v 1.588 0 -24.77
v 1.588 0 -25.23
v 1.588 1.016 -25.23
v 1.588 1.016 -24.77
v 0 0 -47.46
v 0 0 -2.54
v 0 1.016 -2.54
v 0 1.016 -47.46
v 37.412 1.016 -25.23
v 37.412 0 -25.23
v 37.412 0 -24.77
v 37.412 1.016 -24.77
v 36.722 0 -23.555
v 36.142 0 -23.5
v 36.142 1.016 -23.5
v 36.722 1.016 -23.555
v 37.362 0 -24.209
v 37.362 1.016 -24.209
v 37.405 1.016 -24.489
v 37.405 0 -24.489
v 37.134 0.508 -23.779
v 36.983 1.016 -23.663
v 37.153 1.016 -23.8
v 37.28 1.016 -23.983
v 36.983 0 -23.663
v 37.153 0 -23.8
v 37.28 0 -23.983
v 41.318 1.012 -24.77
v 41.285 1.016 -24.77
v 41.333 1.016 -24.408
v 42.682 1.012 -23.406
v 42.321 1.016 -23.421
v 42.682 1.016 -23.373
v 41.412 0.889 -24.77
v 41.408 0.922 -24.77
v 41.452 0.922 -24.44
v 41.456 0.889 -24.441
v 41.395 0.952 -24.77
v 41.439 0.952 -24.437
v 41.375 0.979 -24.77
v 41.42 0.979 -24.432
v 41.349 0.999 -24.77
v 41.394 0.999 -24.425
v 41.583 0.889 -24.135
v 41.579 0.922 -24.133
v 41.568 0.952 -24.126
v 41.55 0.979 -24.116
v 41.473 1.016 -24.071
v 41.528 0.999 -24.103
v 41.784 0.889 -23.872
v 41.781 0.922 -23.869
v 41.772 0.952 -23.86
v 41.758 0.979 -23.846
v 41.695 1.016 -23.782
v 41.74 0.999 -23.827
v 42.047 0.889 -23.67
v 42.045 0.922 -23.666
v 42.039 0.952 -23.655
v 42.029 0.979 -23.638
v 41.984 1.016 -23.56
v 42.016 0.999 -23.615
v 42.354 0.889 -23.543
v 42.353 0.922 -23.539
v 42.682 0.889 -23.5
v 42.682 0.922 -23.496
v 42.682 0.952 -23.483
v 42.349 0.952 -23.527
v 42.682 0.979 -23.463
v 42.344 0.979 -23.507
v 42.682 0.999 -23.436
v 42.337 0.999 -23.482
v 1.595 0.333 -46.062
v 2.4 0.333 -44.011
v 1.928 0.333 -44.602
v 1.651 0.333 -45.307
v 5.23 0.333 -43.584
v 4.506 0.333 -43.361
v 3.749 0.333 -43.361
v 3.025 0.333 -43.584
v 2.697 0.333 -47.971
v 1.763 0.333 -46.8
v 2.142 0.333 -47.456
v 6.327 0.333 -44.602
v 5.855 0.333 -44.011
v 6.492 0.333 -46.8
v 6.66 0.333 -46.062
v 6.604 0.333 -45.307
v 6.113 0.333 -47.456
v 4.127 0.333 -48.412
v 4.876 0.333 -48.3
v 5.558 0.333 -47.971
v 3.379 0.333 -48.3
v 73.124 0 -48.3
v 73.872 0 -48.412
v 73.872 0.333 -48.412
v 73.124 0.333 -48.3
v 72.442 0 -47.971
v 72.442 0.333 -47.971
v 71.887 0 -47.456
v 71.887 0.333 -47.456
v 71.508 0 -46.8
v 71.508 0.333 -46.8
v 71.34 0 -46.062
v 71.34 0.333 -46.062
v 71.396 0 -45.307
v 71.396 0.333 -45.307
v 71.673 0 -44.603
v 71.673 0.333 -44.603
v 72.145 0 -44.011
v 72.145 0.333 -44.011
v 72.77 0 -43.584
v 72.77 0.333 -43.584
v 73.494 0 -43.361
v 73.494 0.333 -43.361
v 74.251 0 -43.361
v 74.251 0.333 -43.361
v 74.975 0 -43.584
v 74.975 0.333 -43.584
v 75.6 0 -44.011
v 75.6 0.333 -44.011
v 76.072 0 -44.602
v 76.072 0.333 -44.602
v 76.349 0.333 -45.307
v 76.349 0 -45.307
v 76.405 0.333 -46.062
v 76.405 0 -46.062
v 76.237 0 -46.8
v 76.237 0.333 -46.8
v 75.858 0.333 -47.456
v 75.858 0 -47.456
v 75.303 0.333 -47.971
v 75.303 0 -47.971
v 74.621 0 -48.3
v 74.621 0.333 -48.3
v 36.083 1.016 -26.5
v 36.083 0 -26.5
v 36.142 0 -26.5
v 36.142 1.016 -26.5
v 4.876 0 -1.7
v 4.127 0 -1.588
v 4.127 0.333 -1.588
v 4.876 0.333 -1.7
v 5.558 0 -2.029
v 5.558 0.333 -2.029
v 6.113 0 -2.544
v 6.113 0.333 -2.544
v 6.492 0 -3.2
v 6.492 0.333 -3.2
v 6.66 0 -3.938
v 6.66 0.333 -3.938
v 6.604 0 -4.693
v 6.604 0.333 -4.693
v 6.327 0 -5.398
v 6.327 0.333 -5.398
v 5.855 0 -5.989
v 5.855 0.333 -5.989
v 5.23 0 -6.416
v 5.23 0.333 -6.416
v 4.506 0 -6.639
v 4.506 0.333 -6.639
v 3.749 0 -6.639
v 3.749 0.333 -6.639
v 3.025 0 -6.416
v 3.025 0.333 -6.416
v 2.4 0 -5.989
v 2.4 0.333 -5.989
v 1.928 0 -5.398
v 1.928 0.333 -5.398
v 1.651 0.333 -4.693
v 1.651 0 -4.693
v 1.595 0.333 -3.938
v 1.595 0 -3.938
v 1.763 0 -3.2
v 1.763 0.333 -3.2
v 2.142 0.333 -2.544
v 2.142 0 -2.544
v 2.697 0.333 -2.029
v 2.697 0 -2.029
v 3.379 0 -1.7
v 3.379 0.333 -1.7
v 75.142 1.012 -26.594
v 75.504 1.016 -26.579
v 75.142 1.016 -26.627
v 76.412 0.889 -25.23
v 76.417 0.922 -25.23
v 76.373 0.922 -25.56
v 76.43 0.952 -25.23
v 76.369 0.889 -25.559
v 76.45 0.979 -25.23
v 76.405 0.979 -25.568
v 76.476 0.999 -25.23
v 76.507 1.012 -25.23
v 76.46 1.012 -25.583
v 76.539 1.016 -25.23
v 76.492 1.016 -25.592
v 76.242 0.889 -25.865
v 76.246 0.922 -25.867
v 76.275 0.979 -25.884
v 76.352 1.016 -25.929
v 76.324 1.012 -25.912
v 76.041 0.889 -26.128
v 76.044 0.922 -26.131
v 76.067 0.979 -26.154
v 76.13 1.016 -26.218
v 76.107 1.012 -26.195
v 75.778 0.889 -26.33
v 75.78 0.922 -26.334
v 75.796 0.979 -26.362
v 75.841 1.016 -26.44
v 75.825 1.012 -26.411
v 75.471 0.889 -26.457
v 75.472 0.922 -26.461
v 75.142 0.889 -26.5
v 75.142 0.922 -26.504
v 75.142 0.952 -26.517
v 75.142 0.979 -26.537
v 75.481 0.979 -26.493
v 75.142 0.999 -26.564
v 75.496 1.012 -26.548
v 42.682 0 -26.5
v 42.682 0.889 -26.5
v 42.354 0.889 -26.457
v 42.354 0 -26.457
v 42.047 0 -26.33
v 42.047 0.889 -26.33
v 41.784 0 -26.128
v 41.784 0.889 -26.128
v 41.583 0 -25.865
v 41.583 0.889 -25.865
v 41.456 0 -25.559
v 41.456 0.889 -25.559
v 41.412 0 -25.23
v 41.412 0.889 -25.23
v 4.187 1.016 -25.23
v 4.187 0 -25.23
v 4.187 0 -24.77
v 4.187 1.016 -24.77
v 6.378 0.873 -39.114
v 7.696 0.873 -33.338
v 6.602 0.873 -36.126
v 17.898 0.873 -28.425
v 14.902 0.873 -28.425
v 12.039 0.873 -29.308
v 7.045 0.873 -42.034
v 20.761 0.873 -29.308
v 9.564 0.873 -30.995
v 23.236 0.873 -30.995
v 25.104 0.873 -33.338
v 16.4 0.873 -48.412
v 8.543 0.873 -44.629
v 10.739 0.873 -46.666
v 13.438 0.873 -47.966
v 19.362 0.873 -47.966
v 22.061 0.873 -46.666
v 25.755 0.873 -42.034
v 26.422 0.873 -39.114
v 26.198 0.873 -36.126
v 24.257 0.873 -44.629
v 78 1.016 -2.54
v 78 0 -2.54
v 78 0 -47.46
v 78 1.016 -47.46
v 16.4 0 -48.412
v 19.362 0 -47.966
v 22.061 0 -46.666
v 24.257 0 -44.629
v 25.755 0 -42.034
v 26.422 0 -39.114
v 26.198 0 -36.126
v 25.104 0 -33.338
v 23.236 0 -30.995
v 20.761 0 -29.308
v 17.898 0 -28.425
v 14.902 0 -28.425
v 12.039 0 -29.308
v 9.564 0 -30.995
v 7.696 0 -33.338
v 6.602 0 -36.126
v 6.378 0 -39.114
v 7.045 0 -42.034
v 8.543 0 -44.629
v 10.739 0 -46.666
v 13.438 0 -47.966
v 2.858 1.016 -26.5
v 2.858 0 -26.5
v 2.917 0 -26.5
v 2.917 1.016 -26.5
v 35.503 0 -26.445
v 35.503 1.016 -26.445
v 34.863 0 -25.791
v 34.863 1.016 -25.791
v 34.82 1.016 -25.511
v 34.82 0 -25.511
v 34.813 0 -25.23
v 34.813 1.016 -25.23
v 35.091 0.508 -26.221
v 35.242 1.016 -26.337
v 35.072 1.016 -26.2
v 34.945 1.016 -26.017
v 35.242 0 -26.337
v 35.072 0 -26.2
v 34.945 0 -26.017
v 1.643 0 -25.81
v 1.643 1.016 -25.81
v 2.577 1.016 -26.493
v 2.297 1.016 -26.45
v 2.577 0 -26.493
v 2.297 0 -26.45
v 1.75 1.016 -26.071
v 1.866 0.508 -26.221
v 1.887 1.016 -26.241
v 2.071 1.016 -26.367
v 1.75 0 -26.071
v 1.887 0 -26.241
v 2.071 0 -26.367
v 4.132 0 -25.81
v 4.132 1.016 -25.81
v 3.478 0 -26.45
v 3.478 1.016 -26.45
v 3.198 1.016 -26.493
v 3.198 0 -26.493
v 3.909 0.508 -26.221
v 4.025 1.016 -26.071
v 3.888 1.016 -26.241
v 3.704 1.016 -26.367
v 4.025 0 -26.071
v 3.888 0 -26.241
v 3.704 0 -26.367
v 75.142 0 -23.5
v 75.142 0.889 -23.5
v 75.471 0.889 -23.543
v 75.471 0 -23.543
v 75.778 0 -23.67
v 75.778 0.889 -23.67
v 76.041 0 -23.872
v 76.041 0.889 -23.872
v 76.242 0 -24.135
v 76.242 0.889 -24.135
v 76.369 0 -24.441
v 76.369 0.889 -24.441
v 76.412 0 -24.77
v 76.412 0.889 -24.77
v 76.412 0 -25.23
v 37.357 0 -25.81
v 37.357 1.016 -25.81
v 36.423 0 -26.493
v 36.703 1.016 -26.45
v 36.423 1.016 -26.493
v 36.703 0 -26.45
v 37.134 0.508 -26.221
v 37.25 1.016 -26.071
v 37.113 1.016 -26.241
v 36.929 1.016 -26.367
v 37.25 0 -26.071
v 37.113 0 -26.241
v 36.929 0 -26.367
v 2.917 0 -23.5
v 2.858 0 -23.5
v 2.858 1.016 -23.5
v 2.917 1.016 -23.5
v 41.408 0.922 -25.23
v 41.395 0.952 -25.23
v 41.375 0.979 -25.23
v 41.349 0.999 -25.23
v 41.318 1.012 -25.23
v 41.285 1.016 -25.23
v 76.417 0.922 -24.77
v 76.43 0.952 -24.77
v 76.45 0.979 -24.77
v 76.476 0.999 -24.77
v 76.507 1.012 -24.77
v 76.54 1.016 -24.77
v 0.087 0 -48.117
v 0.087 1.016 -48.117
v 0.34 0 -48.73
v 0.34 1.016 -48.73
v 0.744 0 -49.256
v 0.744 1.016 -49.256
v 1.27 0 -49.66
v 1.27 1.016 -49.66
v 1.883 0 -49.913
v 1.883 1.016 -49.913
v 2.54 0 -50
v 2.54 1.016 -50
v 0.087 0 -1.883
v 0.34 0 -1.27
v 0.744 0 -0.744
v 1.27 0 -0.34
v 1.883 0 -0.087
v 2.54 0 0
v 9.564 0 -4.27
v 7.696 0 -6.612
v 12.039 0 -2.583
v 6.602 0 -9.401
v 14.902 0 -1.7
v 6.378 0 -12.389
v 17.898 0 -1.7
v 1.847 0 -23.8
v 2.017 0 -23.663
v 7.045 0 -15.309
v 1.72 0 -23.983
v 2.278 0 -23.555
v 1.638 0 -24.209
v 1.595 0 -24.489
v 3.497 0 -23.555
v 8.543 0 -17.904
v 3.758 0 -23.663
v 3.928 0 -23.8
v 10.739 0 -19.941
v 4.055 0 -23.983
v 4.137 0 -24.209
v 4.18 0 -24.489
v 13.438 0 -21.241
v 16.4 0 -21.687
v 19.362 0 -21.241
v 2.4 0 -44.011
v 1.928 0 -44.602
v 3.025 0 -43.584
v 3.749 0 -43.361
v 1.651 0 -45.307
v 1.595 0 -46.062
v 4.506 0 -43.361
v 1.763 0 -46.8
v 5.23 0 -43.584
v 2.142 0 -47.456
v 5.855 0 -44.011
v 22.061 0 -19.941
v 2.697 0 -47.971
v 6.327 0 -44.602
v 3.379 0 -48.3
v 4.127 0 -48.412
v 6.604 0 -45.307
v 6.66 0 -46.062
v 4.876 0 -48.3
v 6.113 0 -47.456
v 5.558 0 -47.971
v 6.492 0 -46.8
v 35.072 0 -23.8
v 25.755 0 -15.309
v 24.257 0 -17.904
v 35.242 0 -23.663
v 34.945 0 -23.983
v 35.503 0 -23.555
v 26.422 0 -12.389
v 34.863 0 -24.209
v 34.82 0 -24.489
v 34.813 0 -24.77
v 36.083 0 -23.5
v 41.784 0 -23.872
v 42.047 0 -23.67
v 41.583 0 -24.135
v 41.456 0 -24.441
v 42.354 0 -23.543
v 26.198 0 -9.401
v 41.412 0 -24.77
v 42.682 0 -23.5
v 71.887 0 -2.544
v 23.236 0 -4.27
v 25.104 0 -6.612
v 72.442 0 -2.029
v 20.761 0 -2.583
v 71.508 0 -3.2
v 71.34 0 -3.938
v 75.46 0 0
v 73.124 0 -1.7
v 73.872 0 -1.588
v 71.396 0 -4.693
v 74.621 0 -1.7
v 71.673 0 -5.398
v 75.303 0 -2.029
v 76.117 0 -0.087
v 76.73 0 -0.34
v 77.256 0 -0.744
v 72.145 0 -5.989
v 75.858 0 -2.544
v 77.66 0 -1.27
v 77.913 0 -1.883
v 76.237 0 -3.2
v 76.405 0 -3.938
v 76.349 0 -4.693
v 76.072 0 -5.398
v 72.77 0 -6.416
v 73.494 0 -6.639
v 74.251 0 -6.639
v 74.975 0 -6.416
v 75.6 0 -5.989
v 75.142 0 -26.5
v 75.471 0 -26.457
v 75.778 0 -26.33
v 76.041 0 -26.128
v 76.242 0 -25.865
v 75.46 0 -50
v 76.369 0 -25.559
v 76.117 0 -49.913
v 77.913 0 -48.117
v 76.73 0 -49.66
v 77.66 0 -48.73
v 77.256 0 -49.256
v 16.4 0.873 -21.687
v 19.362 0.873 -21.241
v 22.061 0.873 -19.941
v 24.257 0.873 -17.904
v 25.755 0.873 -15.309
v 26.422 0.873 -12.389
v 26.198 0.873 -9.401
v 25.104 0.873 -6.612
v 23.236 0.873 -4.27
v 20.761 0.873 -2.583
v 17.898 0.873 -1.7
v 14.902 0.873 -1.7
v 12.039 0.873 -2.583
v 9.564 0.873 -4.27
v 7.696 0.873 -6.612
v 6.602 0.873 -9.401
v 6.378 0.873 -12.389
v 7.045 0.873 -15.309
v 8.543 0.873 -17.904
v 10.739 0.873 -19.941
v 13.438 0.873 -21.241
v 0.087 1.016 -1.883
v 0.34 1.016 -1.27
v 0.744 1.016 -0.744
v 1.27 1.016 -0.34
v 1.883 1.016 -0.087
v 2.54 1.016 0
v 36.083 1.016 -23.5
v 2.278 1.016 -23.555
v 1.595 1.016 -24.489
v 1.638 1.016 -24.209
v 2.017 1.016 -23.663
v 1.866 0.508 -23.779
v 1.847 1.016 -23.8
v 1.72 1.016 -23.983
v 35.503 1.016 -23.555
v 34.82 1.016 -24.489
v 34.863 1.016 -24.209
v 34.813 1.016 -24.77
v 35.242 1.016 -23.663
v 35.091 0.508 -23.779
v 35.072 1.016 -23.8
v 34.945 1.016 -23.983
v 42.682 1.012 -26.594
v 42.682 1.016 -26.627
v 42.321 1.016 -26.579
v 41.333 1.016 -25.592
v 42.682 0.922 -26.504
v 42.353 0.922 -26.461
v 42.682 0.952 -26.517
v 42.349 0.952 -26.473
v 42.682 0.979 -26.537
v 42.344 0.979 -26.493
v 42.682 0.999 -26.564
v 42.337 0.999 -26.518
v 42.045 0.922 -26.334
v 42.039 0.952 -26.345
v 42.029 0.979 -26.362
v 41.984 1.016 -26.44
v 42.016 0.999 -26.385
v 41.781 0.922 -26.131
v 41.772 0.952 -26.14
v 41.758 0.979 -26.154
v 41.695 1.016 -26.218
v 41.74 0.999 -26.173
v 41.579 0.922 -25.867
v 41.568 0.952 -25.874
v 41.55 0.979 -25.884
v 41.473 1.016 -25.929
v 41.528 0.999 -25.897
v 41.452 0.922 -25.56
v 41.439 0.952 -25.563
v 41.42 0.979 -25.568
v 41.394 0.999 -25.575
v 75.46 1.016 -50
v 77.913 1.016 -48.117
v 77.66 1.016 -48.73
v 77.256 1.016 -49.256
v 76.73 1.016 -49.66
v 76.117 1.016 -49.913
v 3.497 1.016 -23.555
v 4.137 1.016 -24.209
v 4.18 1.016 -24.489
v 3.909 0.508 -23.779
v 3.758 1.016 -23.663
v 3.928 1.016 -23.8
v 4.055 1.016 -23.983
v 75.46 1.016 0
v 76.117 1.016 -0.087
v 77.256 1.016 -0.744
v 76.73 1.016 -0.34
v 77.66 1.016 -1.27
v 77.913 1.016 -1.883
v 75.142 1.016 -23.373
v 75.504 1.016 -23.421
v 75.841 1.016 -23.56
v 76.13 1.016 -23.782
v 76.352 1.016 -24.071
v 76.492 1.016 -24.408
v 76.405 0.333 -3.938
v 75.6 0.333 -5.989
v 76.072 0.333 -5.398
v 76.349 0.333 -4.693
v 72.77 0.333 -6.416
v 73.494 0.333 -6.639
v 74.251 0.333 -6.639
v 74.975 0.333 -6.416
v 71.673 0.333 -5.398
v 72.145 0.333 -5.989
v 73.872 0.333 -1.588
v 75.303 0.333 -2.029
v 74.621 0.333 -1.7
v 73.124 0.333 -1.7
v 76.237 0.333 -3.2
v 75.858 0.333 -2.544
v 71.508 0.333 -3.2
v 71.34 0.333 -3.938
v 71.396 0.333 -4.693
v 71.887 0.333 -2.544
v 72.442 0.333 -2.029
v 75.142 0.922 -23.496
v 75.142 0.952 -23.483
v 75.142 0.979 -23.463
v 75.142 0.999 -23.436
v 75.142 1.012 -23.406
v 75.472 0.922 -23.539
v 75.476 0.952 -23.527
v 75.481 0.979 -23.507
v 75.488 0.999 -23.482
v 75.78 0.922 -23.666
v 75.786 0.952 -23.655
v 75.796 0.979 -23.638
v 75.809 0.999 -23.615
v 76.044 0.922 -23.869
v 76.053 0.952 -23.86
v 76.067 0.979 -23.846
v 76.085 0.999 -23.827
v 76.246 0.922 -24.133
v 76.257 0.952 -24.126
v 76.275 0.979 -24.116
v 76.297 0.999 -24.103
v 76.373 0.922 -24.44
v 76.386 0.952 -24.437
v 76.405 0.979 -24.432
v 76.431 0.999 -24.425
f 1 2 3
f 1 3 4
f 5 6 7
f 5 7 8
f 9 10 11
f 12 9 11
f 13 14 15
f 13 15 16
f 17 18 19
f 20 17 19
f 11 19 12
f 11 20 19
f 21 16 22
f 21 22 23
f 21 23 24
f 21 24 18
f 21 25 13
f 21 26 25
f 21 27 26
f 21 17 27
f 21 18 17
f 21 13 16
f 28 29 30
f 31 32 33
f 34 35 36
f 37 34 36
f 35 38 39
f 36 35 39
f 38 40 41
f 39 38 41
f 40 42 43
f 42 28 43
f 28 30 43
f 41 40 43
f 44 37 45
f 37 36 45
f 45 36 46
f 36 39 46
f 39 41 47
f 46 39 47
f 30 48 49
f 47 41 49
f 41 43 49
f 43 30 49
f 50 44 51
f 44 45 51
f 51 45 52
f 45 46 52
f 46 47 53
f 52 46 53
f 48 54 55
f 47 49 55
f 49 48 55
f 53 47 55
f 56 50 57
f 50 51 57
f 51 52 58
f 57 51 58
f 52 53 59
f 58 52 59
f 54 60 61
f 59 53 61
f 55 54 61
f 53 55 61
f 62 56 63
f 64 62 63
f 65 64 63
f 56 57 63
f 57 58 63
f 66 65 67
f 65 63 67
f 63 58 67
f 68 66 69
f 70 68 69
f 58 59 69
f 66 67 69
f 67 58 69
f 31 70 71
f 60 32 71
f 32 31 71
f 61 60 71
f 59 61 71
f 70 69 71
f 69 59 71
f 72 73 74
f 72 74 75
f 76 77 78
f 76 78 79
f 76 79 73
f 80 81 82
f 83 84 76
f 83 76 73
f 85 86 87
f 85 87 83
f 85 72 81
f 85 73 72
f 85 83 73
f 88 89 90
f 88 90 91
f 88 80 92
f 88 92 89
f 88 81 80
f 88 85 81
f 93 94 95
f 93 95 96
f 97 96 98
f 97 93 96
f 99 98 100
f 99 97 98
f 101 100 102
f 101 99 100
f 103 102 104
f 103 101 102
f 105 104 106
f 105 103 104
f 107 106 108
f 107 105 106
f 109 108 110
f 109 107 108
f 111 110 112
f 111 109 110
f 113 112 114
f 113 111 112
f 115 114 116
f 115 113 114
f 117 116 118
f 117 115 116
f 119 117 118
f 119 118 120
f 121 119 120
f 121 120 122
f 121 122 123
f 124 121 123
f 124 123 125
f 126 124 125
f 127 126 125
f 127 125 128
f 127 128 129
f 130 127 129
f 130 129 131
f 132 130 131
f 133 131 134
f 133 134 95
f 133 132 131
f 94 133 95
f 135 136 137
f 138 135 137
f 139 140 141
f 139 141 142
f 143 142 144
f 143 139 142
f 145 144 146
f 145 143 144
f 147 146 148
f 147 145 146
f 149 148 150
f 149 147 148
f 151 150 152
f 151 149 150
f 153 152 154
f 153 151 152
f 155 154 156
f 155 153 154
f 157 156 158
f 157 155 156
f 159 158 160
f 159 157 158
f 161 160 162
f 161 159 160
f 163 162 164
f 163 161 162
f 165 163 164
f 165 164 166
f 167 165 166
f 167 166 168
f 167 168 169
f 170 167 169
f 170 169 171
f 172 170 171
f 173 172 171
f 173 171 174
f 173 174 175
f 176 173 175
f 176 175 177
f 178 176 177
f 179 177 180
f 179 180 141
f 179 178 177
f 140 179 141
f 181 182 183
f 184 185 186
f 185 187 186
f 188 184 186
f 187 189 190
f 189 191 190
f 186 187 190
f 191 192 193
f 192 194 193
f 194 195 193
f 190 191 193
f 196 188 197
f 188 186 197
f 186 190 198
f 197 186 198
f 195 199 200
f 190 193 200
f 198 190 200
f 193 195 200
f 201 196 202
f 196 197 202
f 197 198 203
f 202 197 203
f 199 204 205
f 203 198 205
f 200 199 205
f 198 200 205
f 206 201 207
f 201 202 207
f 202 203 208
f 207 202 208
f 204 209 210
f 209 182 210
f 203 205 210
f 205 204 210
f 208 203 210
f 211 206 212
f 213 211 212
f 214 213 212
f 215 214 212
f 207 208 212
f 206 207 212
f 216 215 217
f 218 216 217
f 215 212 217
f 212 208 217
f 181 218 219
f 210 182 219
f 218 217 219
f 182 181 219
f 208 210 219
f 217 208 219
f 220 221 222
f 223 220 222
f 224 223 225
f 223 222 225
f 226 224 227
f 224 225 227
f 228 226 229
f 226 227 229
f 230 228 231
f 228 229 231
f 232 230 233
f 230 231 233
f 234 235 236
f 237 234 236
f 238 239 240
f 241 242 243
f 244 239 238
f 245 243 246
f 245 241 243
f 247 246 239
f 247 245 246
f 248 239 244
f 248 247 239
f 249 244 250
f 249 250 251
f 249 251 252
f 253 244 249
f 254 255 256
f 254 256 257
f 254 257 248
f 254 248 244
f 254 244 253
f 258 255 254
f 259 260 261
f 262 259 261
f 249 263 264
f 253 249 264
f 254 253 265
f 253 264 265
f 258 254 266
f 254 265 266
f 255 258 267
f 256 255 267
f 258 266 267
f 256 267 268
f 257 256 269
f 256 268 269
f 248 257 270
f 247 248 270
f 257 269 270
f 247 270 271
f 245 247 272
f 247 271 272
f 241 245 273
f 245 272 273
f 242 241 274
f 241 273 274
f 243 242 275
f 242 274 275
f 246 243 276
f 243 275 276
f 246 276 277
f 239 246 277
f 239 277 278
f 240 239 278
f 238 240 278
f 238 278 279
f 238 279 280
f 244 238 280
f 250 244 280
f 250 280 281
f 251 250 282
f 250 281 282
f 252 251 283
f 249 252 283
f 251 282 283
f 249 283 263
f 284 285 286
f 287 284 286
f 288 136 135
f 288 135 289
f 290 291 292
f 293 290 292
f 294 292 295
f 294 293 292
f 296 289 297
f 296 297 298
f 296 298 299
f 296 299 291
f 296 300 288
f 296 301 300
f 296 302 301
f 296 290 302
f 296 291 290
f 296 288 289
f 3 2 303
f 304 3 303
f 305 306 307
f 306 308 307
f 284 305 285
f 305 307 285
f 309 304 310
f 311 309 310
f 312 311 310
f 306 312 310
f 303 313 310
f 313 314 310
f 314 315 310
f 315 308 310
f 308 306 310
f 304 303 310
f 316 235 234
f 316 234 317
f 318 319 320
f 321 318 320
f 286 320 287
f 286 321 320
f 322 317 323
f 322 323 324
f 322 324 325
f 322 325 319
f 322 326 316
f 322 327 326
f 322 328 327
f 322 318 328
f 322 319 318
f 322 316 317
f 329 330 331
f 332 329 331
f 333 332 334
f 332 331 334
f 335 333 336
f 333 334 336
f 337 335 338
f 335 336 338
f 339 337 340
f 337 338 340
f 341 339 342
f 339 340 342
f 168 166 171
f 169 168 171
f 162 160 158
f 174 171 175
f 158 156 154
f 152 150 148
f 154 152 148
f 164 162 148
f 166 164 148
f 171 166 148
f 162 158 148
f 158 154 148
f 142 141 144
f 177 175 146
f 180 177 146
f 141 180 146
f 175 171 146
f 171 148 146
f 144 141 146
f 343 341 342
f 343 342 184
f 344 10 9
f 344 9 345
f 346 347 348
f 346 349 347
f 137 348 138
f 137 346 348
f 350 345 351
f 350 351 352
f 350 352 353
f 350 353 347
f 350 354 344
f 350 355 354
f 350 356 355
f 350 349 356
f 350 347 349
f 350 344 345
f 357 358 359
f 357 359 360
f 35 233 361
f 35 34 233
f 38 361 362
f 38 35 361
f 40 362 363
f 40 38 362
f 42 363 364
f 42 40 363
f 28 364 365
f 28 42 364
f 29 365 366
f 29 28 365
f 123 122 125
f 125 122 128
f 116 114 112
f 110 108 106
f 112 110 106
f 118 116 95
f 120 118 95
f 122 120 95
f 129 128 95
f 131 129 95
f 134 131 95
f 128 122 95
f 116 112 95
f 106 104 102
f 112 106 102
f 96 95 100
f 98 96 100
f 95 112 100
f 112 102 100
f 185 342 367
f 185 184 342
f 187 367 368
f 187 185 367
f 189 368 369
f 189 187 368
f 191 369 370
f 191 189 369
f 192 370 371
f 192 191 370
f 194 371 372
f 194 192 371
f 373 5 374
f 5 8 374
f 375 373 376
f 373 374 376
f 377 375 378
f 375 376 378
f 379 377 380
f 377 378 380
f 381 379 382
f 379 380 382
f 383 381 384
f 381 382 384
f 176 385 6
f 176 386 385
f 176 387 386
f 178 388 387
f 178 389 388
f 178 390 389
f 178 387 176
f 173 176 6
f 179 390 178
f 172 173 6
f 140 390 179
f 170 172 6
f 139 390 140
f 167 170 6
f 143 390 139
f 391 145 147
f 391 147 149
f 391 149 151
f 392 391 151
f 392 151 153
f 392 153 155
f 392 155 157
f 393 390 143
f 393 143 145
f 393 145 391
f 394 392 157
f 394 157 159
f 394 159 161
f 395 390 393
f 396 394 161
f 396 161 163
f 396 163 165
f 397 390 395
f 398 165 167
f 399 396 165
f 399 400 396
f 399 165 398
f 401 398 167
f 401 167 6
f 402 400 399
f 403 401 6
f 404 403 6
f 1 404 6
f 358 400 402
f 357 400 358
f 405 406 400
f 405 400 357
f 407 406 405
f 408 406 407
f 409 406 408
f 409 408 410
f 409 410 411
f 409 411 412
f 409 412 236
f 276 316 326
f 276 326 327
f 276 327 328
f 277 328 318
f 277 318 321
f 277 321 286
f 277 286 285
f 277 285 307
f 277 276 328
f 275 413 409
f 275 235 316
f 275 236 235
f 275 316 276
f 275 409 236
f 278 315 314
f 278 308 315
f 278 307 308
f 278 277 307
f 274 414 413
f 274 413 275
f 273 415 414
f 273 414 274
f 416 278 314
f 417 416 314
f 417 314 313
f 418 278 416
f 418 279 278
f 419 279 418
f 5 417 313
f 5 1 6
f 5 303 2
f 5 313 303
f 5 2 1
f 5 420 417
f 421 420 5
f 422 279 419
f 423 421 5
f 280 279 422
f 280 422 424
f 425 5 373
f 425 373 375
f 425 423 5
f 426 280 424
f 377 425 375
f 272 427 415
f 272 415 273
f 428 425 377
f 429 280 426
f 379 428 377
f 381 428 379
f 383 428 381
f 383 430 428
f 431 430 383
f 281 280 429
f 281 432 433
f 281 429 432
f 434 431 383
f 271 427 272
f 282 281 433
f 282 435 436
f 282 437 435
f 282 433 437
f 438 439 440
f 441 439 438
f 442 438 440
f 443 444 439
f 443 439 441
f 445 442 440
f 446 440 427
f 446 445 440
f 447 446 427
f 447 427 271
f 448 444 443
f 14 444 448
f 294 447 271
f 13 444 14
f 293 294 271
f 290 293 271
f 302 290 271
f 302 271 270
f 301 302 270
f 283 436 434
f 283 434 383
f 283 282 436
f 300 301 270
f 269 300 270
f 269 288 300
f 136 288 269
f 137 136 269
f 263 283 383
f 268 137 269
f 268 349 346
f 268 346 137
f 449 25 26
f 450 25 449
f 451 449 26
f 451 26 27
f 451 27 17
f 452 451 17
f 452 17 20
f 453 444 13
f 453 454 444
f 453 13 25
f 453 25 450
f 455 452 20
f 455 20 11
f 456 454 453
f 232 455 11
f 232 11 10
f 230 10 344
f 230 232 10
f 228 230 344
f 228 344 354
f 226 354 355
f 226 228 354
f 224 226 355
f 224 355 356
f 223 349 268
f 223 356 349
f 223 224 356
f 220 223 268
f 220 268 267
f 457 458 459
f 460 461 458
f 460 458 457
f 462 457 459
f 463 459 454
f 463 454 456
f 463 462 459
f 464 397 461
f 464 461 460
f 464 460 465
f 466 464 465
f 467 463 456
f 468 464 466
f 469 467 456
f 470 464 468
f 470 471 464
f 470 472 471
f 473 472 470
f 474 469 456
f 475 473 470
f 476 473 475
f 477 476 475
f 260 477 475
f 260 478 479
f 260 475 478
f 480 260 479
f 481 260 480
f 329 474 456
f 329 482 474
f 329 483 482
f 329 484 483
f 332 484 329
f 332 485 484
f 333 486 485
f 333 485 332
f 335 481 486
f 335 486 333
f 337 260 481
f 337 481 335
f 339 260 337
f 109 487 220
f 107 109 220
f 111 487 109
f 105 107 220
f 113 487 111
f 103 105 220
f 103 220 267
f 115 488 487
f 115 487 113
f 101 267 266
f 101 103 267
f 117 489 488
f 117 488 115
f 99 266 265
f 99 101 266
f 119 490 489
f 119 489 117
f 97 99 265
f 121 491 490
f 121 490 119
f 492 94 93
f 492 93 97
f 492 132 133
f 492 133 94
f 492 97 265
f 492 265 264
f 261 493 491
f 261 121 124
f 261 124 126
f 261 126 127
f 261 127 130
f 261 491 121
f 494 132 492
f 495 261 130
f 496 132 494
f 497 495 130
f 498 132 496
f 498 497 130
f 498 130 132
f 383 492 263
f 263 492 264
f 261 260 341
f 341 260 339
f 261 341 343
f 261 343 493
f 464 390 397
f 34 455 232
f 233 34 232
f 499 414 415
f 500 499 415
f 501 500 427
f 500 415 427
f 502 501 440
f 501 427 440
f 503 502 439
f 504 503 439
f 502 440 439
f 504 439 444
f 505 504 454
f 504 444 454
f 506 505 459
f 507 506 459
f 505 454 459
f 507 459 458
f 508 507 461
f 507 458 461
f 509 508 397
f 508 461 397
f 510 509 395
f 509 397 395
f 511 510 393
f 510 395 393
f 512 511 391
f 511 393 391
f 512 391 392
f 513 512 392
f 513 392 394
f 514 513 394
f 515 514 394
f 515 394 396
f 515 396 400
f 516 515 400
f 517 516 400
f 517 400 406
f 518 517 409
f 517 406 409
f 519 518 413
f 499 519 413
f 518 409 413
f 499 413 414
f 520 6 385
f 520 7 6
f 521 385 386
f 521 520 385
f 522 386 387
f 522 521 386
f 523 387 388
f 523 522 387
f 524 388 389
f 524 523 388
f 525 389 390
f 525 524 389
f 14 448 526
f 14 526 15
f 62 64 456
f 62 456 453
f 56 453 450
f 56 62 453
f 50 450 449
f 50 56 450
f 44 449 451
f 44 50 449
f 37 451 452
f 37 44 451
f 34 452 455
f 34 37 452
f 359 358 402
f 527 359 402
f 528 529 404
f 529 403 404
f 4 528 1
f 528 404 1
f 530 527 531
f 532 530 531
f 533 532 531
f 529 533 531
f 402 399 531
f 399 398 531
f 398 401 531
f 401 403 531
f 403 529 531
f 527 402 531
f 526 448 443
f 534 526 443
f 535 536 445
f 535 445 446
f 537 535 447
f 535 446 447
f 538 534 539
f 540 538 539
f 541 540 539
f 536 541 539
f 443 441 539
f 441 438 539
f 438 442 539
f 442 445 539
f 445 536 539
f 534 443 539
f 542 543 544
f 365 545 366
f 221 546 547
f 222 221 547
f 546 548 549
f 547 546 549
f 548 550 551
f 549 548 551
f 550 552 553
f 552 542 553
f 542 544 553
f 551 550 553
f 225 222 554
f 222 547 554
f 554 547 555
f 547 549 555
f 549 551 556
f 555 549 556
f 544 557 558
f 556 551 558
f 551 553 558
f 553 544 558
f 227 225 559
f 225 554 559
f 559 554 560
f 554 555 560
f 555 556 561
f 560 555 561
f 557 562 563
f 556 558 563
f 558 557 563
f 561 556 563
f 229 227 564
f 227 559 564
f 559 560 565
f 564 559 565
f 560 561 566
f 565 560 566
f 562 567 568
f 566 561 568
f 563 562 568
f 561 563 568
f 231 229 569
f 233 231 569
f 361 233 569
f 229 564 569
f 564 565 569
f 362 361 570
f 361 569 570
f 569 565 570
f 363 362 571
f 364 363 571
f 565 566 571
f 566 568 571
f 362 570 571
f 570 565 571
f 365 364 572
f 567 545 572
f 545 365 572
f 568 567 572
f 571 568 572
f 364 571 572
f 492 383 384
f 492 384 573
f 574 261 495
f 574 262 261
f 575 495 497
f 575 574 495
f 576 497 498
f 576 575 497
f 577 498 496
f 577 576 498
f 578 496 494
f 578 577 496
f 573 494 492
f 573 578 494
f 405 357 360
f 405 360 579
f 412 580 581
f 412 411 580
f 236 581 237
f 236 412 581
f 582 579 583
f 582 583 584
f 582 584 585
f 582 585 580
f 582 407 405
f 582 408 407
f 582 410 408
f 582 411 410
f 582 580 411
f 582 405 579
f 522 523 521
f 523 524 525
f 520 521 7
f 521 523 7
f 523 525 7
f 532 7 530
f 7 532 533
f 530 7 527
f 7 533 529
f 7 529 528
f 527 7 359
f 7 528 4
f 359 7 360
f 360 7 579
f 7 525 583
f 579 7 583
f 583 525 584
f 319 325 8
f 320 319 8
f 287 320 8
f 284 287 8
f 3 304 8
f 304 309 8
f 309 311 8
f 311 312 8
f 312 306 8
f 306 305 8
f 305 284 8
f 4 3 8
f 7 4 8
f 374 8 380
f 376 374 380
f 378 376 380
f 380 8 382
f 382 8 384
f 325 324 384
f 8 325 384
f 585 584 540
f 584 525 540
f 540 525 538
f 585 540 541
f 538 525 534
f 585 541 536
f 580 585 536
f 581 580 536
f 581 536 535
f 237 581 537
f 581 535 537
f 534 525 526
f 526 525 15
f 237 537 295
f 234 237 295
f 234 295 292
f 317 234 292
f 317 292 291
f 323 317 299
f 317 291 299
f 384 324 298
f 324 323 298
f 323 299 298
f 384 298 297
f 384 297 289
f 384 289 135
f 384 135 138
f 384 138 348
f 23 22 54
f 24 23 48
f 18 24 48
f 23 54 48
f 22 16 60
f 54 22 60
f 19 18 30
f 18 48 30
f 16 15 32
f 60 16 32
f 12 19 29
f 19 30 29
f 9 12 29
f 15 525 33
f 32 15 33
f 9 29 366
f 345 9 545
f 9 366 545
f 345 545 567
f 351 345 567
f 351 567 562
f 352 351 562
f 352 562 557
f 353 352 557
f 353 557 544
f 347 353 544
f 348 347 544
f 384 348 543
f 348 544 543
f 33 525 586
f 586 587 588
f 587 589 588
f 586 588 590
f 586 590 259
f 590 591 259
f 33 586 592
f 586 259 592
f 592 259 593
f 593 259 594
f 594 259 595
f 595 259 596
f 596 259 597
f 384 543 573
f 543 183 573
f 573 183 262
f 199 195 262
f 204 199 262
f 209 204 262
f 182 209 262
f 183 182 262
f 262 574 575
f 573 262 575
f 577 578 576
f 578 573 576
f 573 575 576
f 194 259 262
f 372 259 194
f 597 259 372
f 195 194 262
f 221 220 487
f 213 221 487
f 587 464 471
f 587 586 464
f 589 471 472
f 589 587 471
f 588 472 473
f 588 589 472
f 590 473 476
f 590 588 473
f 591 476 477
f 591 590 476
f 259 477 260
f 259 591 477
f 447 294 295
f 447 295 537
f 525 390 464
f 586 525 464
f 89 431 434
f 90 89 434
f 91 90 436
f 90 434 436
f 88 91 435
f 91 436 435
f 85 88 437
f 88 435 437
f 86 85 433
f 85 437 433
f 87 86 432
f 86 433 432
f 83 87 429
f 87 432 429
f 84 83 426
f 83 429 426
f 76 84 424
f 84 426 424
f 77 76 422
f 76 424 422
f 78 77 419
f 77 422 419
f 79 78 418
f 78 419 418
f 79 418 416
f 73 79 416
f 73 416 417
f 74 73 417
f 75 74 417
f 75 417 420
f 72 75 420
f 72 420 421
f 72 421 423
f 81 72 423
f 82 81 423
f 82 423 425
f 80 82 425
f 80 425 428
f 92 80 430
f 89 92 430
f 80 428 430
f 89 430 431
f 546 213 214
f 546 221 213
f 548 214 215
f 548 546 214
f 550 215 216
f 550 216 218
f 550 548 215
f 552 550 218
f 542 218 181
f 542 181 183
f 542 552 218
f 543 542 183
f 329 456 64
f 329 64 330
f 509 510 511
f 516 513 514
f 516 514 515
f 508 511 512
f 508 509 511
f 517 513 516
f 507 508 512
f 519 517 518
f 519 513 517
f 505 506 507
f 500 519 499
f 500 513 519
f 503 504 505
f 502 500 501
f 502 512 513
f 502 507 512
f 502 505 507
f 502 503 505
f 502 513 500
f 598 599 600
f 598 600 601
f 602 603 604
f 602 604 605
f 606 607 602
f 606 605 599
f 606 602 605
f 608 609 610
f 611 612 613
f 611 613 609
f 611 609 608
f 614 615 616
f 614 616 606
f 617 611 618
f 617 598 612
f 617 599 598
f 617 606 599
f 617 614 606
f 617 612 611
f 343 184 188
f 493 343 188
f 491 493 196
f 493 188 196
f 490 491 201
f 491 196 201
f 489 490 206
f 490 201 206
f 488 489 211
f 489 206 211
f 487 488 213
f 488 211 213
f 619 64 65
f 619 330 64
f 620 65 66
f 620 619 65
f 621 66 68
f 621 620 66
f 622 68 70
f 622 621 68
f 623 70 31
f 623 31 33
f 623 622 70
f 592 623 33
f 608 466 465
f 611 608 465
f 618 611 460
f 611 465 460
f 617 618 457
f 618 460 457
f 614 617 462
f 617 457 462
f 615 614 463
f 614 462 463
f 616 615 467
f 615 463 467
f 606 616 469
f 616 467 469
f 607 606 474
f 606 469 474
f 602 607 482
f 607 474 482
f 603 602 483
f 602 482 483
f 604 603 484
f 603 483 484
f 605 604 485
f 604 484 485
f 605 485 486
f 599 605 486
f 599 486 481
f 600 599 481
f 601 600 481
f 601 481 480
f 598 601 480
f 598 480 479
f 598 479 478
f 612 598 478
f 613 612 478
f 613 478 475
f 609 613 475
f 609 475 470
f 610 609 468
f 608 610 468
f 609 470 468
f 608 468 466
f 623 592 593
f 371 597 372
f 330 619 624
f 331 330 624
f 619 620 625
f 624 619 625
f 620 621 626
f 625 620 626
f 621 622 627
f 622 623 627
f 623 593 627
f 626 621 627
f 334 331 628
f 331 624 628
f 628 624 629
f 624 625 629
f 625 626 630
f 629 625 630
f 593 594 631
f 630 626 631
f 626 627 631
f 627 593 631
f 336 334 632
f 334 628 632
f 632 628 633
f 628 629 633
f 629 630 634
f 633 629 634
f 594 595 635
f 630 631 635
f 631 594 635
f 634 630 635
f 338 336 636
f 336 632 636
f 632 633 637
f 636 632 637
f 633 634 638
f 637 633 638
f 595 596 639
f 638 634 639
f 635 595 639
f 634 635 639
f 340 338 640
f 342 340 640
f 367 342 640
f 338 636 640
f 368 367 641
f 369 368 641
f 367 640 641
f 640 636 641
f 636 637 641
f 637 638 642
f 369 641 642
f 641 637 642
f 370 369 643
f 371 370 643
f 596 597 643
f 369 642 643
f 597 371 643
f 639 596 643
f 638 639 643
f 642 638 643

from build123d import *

# Parameters (mm, degrees)
SKETCH1_W                   = 78
SKETCH1_H                   = 50
STEEL_FACE_DEPTH            = 1.016
CARD_EDGES_R                = 2.54
SKETCH2_R                   = 2.54
MAGNET_CAVITY_DEPTH         = 0.333375
MIRROR2_COPY_1_SKETCH_R     = 2.54
MIRROR2_COPY_1_DEPTH        = 0.333375
SKETCH3_R                   = 10.049999966
BATTERY_POCKETS_DEPTH       = 0.873000032
SKETCH5_W                   = 35.000000104
SKETCH5_H                   = 3.000000096
LED_SLOT_DEPTH              = 93.655449144
LED_SLOT_CORNER_ROUND_R     = 1.27
LED_SLOT_SURFACE_ROUND_R    = 0.127
SKETCH6_W                   = 2.59999988
SKETCH6_H                   = 3.000000096
ALS_DATA_SENSOR_SLOT_DEPTH  = 93.655449144
SKETCH8_W                   = 2.59999988
SKETCH8_H                   = 3.000000096
ALS_CLOCK_SENSOR_SLOT_DEPTH = 93.655449144
FILLET4_SIZE                = 1.27


with BuildPart() as part:
    # Sketch1 → steel_face (new body)
    with BuildSketch(Plane(origin=(0, 0, 0), x_dir=(1, 0, 0), z_dir=(0, 1, 0))):
        with Locations((39, 25)):
            Rectangle(SKETCH1_W, SKETCH1_H)
    extrude(amount=STEEL_FACE_DEPTH)

    # card_edges
    card_edges_edges = [part.edges().sort_by_distance(p)[0] for p in [
        (0, 0.508, -50),
        (78, 0.508, -50),
        (78, 0.508, 0),
        (0, 0.508, 0),
    ]]
    fillet(card_edges_edges, radius=CARD_EDGES_R)

    # Sketch2 → magnet_cavity (cut)
    with BuildSketch(Plane.XZ):
        with Locations(Location((4.1275, -45.8725, 0), (0, 0, 270))):
            Circle(SKETCH2_R)
    magnet_cavity = extrude(amount=-MAGNET_CAVITY_DEPTH, mode=Mode.SUBTRACT)

    # Mirror1: magnet_cavity across plane
    add(magnet_cavity.mirror(Plane.XY.offset(-25.000000038)), mode=Mode.SUBTRACT)

    # Mirror2: magnet_cavity across plane
    add(magnet_cavity.mirror(Plane(origin=(38.999999978, 0, 0), x_dir=(0, 0, 1), z_dir=(1, 0, 0))), mode=Mode.SUBTRACT)

    # Mirror2 copy 1 sketch → Mirror2 copy 1 (cut)
    with BuildSketch(Plane(origin=(77.999999956, 0, -50.000000076), x_dir=(-1, 0, 0), z_dir=(0, -1, 0))):
        with Locations(Location((4.1275, -45.8725, 0), (0, 0, 270))):
            Circle(MIRROR2_COPY_1_SKETCH_R)
    extrude(amount=-MIRROR2_COPY_1_DEPTH, mode=Mode.SUBTRACT)

    # Sketch3 → battery_pockets (cut)
    with BuildSketch(Plane.XZ):
        with Locations(Location((16.399999966, -11.637499966, 0), (0, 0, 270))):
            Circle(SKETCH3_R)
        with Locations(Location((16.399999966, -38.362500034, 0), (0, 0, 270))):
            Circle(SKETCH3_R)
    extrude(amount=-BATTERY_POCKETS_DEPTH, mode=Mode.SUBTRACT)

    # Sketch5 → led_slot (cut, through all)
    with BuildSketch(Plane(origin=(0, 0, 0), x_dir=(1, 0, 0), z_dir=(0, 1, 0))):
        with Locations((58.912499948, 25.000000038)):
            Rectangle(SKETCH5_W, SKETCH5_H)
    extrude(amount=LED_SLOT_DEPTH, mode=Mode.SUBTRACT)

    # led_slot_corner_round
    led_slot_corner_round_edges = [part.edges().sort_by_distance(p)[0] for p in [
        (76.4125, 0.508, -23.49999999),
        (76.4125, 0.508, -26.500000086),
        (41.412499896, 0.508, -26.500000086),
        (41.412499896, 0.508, -23.49999999),
    ]]
    fillet(led_slot_corner_round_edges, radius=LED_SLOT_CORNER_ROUND_R)

    # led_slot_surface_round
    led_slot_surface_round_edges = [part.edges().sort_by_distance(p)[0] for p in [
        (58.912499948, 1.016, -26.500000086),
        (41.412499896, 1.016, -25.000000038),
        (58.912499948, 1.016, -23.49999999),
        (76.4125, 1.016, -25.000000038),
        (41.784474284, 1.016, -26.128025698),
        (41.784474284, 1.016, -23.871974378),
        (76.040525612, 1.016, -26.128025698),
        (76.040525612, 1.016, -23.871974378),
    ]]
    fillet(led_slot_surface_round_edges, radius=LED_SLOT_SURFACE_ROUND_R)

    # Sketch6 → als_data_sensor_slot (cut, through all)
    with BuildSketch(Plane.XZ):
        with Locations((2.88749994, -25.000000038)):
            Rectangle(SKETCH6_W, SKETCH6_H)
    extrude(amount=-ALS_DATA_SENSOR_SLOT_DEPTH, mode=Mode.SUBTRACT)

    # Sketch8 → als_clock_sensor_slot (cut, through all)
    with BuildSketch(Plane.XZ):
        with Locations((36.112500038, -25.000000038)):
            Rectangle(SKETCH8_W, SKETCH8_H)
    extrude(amount=-ALS_CLOCK_SENSOR_SLOT_DEPTH, mode=Mode.SUBTRACT)

    # Fillet4
    # a fillet whose section is not a circle: 1.27 mm, written as the material it adds along each edge
    with BuildSketch(Plane(origin=(1.5875, 0, -26.500000086), x_dir=(0, 0, 1), z_dir=(0, 1, 0)), Plane(origin=(1.5875, 0, -23.49999999), x_dir=(1, 0, 0), z_dir=(0, 1, 0)), Plane(origin=(34.812500098, 0, -23.49999999), x_dir=(1, 0, 0), z_dir=(0, 1, 0))) as fillet4_piece_1:
        with BuildLine():
            add(Edge.make_bspline([(FILLET4_SIZE, 0), (FILLET4_SIZE * 0.831801948466, 0), (FILLET4_SIZE * 0.663603896932, 0), (FILLET4_SIZE * 0.292893218813, FILLET4_SIZE * 0.0716919198361), (FILLET4_SIZE * 0.0716919198361, FILLET4_SIZE * 0.292893218813), (0, FILLET4_SIZE * 0.663603896932), (0, FILLET4_SIZE * 0.831801948466), (0, FILLET4_SIZE)], knots=[0, 0, 0, 0, 0, 0, 0.5, 0.5, 1, 1, 1, 1, 1, 1], degree=5))
            Line((0, FILLET4_SIZE), (-FILLET4_SIZE * 0.02, FILLET4_SIZE))
            Line((-FILLET4_SIZE * 0.02, FILLET4_SIZE), (-FILLET4_SIZE * 0.02, -FILLET4_SIZE * 0.02))
            Line((-FILLET4_SIZE * 0.02, -FILLET4_SIZE * 0.02), (FILLET4_SIZE, -FILLET4_SIZE * 0.02))
            Line((FILLET4_SIZE, -FILLET4_SIZE * 0.02), (FILLET4_SIZE, 0))
        make_face()
    extrude(amount=1.016)
    with BuildSketch(Plane(origin=(4.18749988, 0, -26.500000086), x_dir=(0, 0, 1), z_dir=(0, 1, 0)), Plane(origin=(4.18749988, 0, -23.49999999), x_dir=(-1, 0, 0), z_dir=(0, 1, 0)), Plane(origin=(34.812500098, 0, -26.500000086), x_dir=(1, 0, 0), z_dir=(0, 1, 0)), Plane(origin=(37.412499978, 0, -26.500000086), x_dir=(0, 0, 1), z_dir=(0, 1, 0)), Plane(origin=(37.412499978, 0, -23.49999999), x_dir=(-1, 0, 0), z_dir=(0, 1, 0))) as fillet4_piece_2:
        with BuildLine():
            add(Edge.make_bspline([(FILLET4_SIZE, 0), (FILLET4_SIZE * 0.831801948466, 0), (FILLET4_SIZE * 0.663603896932, 0), (FILLET4_SIZE * 0.292893218813, -FILLET4_SIZE * 0.0716919198361), (FILLET4_SIZE * 0.0716919198361, -FILLET4_SIZE * 0.292893218813), (0, -FILLET4_SIZE * 0.663603896932), (0, -FILLET4_SIZE * 0.831801948466), (0, -FILLET4_SIZE)], knots=[0, 0, 0, 0, 0, 0, 0.5, 0.5, 1, 1, 1, 1, 1, 1], degree=5))
            Line((0, -FILLET4_SIZE), (-FILLET4_SIZE * 0.02, -FILLET4_SIZE))
            Line((-FILLET4_SIZE * 0.02, -FILLET4_SIZE), (-FILLET4_SIZE * 0.02, FILLET4_SIZE * 0.02))
            Line((-FILLET4_SIZE * 0.02, FILLET4_SIZE * 0.02), (FILLET4_SIZE, FILLET4_SIZE * 0.02))
            Line((FILLET4_SIZE, FILLET4_SIZE * 0.02), (FILLET4_SIZE, 0))
        make_face()
    extrude(amount=1.016)


solid = part.part
